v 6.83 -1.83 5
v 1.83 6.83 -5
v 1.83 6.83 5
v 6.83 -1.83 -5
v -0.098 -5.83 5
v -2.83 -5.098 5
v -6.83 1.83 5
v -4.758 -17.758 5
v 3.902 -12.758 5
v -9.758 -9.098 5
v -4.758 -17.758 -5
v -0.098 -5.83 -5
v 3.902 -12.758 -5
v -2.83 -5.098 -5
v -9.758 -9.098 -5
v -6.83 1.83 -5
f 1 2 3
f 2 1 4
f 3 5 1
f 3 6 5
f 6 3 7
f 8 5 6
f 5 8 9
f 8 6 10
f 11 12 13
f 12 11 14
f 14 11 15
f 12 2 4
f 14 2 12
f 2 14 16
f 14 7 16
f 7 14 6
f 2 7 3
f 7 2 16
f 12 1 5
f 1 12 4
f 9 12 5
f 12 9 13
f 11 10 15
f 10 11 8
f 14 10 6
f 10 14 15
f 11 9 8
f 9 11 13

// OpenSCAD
difference() {
    rotate([0,0,+30]) {
        cube(10, center=true);
        translate([-8,-8,0])
            cube(10, center=true);
    }
}
